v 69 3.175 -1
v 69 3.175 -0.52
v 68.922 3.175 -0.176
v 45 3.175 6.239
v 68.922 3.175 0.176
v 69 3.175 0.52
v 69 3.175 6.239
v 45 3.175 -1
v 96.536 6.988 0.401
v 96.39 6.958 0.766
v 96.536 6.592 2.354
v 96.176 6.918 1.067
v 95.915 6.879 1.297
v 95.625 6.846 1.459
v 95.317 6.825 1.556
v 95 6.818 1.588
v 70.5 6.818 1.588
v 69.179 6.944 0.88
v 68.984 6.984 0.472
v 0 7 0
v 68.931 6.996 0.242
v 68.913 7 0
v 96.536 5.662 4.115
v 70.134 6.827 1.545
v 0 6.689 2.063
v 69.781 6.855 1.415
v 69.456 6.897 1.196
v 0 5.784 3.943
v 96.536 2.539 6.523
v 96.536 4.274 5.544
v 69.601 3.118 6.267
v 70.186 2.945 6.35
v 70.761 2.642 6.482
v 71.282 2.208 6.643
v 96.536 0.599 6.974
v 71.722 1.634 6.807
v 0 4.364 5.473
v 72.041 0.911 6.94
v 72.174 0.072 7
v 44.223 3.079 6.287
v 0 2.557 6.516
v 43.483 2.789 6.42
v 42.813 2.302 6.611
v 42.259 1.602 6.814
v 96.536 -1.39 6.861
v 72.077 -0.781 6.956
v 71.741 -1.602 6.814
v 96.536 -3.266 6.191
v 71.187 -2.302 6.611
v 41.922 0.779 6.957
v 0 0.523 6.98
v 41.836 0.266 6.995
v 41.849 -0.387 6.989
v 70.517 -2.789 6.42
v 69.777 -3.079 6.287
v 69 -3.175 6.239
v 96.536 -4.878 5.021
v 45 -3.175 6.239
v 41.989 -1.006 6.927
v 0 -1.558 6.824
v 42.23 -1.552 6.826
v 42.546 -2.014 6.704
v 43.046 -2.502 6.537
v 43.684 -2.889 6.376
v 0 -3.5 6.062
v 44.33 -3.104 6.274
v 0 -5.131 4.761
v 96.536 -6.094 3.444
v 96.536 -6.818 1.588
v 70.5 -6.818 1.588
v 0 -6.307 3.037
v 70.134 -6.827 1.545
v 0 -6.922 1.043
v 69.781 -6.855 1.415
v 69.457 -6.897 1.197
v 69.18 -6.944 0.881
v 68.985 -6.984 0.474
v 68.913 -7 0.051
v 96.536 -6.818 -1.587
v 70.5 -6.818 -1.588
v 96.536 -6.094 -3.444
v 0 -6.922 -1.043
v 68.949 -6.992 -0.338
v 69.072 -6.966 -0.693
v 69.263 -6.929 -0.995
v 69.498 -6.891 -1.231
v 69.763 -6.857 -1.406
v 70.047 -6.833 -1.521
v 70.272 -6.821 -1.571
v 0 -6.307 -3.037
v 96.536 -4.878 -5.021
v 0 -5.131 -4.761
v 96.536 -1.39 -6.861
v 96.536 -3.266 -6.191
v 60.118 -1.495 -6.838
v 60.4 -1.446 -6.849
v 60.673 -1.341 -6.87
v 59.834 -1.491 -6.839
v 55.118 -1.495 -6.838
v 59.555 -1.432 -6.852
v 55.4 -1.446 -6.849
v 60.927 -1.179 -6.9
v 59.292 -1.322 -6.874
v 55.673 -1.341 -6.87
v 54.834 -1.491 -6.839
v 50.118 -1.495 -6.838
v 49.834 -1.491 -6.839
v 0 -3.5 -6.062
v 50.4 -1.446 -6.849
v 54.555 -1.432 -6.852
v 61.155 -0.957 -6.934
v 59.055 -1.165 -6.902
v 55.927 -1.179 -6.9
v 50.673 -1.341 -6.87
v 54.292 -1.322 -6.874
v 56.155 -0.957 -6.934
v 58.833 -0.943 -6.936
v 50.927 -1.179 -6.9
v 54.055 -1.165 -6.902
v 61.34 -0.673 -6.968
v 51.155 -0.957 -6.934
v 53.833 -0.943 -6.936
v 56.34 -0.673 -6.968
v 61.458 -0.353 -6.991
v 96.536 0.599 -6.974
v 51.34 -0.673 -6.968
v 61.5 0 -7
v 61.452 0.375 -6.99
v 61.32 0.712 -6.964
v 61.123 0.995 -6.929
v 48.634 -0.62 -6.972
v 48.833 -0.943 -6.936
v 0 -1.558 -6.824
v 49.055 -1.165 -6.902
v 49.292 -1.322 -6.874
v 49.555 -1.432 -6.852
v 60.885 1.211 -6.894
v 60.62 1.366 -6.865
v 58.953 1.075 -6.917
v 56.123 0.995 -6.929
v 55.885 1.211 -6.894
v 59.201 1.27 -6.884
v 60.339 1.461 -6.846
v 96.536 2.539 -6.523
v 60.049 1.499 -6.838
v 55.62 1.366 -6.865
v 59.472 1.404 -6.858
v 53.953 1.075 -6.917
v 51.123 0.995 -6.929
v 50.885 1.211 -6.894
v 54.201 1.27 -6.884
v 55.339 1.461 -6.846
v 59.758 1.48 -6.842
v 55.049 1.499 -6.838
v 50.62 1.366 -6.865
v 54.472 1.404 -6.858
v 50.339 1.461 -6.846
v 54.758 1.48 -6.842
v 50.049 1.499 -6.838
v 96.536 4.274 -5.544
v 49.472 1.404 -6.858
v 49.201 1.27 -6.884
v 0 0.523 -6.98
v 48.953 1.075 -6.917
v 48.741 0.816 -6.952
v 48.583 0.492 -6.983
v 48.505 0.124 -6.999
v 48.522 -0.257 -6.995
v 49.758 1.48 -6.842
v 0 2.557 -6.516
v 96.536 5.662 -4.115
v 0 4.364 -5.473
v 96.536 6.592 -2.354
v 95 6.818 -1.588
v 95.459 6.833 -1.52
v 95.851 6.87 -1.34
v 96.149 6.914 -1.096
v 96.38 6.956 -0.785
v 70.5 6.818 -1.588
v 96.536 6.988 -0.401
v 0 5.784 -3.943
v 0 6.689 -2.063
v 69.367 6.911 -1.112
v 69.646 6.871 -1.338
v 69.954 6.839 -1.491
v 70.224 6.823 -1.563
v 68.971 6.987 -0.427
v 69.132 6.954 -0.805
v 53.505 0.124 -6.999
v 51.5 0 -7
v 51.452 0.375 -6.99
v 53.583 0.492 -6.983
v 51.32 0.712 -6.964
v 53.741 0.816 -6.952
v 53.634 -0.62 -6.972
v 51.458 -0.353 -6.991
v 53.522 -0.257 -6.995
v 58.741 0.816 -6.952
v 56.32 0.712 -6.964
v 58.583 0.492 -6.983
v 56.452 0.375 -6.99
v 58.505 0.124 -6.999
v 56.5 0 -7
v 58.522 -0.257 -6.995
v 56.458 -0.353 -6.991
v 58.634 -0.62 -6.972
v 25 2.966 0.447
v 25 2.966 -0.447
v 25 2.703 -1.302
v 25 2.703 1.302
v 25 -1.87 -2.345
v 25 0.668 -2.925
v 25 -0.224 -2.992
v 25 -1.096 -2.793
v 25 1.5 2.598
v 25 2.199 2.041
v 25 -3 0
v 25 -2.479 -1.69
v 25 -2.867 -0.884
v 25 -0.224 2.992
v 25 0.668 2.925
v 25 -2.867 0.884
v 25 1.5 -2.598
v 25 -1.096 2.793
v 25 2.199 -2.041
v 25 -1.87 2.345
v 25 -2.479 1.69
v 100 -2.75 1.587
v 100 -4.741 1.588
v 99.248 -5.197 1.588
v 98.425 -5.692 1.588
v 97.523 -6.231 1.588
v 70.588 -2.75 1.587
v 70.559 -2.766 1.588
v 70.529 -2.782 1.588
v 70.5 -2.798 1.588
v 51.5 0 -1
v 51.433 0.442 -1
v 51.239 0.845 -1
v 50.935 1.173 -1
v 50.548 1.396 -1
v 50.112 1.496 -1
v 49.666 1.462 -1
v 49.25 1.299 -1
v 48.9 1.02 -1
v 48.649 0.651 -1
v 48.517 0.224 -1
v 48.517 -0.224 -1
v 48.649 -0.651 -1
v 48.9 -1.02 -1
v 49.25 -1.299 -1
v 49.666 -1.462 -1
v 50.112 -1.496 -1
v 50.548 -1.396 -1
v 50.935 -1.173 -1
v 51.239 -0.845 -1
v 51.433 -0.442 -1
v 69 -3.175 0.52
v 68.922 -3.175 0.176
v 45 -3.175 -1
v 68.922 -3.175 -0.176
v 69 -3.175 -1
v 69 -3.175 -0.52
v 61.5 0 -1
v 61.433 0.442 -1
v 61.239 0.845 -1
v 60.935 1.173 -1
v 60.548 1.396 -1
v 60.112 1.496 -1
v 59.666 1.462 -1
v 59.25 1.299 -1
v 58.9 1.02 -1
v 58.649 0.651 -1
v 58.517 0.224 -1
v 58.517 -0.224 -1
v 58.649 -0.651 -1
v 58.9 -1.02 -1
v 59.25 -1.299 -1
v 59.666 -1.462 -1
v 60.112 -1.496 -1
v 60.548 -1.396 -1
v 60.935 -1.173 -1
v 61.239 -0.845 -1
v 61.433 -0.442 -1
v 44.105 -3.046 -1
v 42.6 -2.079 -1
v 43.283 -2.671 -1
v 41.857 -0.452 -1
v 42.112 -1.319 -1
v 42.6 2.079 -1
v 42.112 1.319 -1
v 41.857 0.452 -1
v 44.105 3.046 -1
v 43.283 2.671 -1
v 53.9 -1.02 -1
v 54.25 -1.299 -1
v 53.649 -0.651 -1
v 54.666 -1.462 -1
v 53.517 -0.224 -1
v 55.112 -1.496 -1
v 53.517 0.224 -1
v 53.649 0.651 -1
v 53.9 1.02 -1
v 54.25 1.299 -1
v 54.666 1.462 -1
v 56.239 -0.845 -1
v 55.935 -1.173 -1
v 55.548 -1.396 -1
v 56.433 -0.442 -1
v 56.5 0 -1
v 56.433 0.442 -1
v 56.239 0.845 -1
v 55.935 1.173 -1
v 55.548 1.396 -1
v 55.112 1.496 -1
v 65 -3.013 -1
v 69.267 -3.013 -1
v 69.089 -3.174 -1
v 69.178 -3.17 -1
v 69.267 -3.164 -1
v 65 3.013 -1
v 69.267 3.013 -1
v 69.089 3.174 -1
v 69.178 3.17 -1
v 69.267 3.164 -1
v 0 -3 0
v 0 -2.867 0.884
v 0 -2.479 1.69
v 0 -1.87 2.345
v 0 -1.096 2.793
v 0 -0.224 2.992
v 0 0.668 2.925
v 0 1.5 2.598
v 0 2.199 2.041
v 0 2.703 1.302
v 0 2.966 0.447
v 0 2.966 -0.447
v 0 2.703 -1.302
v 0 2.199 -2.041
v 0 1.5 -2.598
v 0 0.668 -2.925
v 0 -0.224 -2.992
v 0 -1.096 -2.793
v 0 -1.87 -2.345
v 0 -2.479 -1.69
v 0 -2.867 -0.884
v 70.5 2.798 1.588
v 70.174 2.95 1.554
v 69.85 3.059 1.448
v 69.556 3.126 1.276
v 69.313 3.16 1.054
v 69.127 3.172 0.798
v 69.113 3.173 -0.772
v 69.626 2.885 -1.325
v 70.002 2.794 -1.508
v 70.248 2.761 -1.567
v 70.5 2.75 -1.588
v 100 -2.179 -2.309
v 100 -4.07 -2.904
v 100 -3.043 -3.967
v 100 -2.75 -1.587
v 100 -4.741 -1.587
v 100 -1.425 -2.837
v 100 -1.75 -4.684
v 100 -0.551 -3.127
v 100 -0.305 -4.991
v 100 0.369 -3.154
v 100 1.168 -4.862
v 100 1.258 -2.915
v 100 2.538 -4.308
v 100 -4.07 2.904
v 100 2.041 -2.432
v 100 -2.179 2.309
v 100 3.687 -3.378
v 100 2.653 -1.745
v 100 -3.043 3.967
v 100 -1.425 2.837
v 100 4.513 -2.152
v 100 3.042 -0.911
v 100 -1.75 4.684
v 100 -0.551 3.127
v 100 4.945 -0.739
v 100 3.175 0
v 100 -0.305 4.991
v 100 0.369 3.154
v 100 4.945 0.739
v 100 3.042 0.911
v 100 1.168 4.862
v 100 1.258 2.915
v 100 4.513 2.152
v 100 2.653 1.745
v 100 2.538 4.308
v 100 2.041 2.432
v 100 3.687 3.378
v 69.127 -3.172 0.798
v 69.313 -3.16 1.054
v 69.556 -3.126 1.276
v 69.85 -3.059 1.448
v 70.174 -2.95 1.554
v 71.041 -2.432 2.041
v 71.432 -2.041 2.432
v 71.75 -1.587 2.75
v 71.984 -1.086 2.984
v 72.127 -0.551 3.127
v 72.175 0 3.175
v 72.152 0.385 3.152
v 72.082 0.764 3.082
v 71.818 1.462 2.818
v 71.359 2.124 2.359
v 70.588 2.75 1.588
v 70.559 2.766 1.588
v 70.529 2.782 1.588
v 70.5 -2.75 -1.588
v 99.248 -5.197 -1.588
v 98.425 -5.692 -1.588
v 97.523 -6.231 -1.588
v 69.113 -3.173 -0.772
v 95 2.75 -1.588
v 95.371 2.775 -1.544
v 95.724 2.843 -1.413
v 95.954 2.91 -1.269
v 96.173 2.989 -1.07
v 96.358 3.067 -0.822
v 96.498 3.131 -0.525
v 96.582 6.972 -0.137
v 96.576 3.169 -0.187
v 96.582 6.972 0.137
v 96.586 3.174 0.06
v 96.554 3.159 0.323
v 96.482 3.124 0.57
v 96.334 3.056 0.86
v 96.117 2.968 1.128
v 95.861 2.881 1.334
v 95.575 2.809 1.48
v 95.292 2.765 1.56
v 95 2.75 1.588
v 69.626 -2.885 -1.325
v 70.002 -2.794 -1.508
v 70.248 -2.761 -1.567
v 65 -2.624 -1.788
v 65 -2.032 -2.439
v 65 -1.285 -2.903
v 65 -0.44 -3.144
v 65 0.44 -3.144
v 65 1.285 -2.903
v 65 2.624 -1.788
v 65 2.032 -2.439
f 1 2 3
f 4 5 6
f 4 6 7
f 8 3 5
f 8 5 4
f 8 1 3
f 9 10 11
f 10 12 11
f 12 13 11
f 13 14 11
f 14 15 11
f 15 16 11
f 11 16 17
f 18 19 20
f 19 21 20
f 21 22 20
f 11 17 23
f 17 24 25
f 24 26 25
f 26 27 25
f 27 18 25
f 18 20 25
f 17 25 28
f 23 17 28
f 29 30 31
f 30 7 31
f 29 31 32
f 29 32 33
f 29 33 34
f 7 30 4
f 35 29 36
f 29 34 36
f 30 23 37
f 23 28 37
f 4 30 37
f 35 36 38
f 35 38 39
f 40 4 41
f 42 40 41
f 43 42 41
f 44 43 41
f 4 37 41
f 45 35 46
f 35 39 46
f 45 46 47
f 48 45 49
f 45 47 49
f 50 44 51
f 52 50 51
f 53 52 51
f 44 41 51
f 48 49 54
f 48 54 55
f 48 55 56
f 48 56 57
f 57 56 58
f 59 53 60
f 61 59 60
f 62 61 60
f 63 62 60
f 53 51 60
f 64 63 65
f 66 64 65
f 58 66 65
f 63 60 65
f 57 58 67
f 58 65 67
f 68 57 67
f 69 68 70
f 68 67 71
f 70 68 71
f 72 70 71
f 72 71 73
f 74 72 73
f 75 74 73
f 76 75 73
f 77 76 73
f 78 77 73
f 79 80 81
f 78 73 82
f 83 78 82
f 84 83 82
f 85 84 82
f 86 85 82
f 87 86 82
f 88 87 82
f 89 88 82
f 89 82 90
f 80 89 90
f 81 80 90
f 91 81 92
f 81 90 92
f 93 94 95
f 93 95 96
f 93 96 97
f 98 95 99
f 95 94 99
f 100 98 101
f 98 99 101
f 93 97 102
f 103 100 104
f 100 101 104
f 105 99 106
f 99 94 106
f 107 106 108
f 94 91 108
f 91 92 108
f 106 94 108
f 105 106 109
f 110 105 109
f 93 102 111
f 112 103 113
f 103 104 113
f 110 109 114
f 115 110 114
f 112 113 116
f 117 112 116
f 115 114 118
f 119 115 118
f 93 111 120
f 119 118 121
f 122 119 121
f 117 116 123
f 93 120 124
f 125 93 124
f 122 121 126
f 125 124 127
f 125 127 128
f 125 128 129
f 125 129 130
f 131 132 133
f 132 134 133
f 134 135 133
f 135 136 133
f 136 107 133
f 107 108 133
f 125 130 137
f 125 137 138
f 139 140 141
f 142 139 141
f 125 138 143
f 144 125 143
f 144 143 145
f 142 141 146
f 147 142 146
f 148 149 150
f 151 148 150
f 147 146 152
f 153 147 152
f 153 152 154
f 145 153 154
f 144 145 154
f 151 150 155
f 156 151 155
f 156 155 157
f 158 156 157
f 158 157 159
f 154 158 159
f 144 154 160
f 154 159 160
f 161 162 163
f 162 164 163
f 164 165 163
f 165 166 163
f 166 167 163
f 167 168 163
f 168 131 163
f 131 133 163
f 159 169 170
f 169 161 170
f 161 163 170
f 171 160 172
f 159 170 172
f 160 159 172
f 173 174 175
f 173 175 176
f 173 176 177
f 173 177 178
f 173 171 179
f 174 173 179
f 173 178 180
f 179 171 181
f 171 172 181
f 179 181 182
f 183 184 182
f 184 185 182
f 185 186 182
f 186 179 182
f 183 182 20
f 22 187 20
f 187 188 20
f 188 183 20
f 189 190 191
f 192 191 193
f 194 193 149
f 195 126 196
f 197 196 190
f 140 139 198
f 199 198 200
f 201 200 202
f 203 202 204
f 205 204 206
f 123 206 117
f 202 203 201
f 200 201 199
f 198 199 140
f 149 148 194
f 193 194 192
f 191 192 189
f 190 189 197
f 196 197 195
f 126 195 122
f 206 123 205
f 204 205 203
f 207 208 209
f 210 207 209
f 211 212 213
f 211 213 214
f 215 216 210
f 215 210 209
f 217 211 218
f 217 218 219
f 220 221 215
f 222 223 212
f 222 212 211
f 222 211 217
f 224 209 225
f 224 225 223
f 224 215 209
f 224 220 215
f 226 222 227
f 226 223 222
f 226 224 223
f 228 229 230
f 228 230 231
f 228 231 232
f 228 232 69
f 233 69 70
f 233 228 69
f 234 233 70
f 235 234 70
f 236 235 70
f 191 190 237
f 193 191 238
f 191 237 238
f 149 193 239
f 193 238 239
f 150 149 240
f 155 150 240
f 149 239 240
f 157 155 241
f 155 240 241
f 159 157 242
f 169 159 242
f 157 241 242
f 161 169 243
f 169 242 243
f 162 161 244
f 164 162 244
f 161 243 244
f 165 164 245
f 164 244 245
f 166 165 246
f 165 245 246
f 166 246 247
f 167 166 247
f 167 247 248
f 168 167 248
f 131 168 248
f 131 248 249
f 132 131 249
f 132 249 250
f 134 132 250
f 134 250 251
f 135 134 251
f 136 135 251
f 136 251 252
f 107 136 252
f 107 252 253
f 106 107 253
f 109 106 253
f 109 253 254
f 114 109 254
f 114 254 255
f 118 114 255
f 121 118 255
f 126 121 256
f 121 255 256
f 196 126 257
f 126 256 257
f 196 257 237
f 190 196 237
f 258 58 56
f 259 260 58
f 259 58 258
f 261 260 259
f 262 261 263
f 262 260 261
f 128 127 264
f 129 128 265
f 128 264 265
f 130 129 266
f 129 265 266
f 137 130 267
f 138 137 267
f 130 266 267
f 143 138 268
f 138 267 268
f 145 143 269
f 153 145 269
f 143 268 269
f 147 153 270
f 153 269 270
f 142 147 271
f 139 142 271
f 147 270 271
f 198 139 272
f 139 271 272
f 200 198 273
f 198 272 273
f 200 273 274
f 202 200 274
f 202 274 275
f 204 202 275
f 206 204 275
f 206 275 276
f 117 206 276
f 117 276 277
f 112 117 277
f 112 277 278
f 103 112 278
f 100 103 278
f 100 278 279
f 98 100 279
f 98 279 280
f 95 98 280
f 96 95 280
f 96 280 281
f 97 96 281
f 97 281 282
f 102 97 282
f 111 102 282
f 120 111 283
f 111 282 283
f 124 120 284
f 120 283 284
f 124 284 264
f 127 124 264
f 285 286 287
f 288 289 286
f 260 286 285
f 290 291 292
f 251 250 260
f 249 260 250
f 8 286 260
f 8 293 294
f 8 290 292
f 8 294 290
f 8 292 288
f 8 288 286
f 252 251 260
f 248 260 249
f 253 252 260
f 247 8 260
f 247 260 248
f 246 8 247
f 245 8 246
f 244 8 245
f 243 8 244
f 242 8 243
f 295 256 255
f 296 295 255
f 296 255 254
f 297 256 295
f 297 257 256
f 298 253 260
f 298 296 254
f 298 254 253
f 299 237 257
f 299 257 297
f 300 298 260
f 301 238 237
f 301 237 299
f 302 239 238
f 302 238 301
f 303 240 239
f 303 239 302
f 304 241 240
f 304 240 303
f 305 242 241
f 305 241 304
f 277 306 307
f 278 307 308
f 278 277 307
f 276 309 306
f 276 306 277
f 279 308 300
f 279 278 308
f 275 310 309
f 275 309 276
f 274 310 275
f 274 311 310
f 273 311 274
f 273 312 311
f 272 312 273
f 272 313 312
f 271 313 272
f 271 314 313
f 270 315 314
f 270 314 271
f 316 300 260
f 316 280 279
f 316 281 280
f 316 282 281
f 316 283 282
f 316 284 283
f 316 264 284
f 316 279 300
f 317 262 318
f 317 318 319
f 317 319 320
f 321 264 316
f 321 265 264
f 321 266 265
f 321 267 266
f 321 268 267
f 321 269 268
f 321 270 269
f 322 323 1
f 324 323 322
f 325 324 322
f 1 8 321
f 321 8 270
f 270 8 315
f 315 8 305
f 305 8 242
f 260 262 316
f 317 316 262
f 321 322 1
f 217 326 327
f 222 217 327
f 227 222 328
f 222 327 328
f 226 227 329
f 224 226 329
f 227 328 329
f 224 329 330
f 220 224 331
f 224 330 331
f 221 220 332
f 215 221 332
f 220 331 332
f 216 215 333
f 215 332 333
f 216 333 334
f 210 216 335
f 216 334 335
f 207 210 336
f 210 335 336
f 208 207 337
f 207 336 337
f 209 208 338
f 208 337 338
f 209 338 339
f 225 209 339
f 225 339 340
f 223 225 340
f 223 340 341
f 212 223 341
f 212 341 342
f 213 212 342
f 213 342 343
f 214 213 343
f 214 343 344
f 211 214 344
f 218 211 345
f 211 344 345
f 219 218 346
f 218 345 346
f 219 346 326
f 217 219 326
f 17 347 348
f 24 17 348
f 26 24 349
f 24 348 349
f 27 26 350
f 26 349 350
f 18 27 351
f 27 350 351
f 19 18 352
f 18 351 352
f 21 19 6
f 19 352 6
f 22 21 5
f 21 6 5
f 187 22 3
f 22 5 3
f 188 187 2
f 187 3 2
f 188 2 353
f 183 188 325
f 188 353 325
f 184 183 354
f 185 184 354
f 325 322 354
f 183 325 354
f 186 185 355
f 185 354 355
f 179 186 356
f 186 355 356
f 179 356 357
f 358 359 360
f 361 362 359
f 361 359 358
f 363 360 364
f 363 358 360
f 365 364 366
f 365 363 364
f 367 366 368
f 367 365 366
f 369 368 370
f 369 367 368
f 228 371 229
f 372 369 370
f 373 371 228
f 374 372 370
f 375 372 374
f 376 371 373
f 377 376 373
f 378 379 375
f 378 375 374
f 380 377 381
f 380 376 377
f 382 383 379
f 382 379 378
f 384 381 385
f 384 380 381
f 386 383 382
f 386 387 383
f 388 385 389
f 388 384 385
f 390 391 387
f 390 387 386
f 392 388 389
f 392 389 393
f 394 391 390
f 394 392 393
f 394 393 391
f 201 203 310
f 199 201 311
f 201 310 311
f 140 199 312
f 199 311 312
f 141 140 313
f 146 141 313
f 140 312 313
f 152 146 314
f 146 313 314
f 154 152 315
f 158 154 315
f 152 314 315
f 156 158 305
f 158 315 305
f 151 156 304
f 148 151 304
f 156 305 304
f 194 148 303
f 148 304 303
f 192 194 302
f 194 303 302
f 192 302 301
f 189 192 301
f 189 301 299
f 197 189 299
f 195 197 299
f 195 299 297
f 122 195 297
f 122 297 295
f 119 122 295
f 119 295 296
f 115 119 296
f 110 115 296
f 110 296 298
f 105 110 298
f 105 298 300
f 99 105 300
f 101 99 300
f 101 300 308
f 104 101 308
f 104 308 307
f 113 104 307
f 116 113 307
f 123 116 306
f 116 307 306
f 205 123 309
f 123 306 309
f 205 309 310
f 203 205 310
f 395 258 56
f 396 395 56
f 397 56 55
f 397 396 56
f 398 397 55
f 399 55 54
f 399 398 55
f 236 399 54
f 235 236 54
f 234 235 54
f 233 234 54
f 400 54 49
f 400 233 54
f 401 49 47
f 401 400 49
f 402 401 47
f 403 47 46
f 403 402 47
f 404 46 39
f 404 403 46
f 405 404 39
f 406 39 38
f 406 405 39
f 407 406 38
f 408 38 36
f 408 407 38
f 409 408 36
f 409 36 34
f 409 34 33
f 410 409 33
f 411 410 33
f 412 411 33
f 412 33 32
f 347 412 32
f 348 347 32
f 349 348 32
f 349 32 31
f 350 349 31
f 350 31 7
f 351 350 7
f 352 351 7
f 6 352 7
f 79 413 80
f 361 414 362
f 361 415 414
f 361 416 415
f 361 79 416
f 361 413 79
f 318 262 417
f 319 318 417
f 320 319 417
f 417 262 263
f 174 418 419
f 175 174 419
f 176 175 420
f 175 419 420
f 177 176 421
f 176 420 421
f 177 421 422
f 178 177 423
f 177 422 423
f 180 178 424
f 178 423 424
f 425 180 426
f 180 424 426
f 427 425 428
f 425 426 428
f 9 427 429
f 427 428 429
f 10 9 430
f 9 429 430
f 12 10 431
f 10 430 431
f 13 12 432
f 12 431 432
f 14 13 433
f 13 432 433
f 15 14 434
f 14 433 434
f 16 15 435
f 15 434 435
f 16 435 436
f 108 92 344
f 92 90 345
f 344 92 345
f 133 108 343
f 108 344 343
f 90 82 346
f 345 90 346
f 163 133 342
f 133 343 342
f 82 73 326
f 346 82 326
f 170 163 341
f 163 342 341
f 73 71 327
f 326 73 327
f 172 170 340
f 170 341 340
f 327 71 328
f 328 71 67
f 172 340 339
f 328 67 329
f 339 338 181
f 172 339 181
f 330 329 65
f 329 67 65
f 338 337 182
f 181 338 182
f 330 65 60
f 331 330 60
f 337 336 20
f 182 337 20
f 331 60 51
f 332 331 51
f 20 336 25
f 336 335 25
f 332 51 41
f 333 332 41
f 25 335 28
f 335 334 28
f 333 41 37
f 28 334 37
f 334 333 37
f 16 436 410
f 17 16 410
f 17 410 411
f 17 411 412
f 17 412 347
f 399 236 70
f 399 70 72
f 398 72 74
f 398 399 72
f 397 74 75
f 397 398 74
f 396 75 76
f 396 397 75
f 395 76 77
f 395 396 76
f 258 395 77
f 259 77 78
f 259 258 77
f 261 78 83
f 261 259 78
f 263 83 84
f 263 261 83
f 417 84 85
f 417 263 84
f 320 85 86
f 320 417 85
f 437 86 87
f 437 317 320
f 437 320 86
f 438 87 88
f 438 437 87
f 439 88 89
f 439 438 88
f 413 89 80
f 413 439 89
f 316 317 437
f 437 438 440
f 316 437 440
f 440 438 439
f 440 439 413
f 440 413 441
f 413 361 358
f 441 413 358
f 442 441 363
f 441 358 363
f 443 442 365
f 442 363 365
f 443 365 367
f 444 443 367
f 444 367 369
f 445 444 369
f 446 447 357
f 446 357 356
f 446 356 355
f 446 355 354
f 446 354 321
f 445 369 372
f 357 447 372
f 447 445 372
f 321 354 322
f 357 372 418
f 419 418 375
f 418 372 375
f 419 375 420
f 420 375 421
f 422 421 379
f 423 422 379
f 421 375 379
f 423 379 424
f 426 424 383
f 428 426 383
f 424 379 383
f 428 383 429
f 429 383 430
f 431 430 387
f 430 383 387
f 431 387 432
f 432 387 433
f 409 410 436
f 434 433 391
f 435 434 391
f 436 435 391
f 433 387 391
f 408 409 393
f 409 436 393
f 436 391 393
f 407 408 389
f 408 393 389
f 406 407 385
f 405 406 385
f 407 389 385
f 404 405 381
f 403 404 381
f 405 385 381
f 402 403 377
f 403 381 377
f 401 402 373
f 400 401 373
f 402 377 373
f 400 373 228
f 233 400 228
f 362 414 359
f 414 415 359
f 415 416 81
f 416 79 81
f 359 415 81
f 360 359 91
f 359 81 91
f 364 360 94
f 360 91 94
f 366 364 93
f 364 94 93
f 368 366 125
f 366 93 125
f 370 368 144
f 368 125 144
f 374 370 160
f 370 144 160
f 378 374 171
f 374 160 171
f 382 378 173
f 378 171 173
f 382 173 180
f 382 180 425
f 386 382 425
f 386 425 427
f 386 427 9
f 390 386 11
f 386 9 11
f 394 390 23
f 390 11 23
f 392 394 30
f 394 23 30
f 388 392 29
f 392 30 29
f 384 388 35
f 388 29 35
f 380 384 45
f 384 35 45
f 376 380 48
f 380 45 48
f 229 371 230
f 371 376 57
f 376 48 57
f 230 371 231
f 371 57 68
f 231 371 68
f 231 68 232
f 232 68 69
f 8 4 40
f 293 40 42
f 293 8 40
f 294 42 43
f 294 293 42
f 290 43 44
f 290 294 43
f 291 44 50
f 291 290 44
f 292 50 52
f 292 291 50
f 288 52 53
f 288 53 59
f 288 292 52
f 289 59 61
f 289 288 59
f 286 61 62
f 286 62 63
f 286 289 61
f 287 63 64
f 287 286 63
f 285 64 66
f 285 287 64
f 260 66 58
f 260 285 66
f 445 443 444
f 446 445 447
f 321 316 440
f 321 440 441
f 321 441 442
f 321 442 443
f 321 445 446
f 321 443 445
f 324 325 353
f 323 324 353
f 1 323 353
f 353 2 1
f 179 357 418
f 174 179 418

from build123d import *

# Parameters (mm, degrees)
F0_R           = 7
F1_DEPTH       = 100
F2_R           = 3.175
F3_DEPTH       = 35
F4_R           = 3
F5_DEPTH       = 25
F6_SIZE2       = 3.4641016151
F6_SIZE        = 2
F8_DEPTH       = 7.001
F8_DEPTH_BACK  = 1
F10_DEPTH      = 7.0010001
F10_DEPTH_BACK = 7.0010001
F11_W          = 15
F11_H          = 3.175
F12_DEPTH      = 25.0000003725
F13_R          = 1.5
F14_DEPTH      = 6.0010001


with BuildPart() as f1:
    # F0 (on Right) → F1 (new body)
    with BuildSketch(Plane.YZ):
        Circle(F0_R)
    extrude(amount=F1_DEPTH)

    # F2 (on face) → F3 (cut)
    with BuildSketch(Plane.YZ.offset(100)):
        Circle(F2_R)
    extrude(amount=-F3_DEPTH, mode=Mode.SUBTRACT)

    # F4 (on face) → F5 (cut)
    with BuildSketch(Plane(origin=(0, 0, 0), x_dir=(0, -1, 0), z_dir=(-1, 0, 0))):
        Circle(F4_R)
    extrude(amount=-F5_DEPTH, mode=Mode.SUBTRACT)

    # F6
    f6_edges = [f1.edges().sort_by_distance(p)[0] for p in [
        (100, -7, 0),
    ]]
    f6_side = f1.faces().sort_by_distance((100, -6.80201, 0))[0]
    chamfer(f6_edges, length=F6_SIZE, length2=F6_SIZE2, reference=f6_side)

    # F7 (on Top) → F8 (cut, two sides)
    with BuildSketch(Plane.XY) as f8_sk:
        with BuildLine():
            Line((69, 3.175), (45, 3.175))
            ThreePointArc((45, 3.175), (41.825, 0), (45, -3.175))
            Line((45, -3.175), (69, -3.175))
            ThreePointArc((69, -3.175), (72.175, 0), (69, 3.175))
        make_face()
    extrude(amount=F8_DEPTH, mode=Mode.SUBTRACT)
    extrude(f8_sk.sketch, amount=-F8_DEPTH_BACK, mode=Mode.SUBTRACT)

    # F9 (on Front) → F10 (cut, two sides)
    with BuildSketch(Plane.XZ) as f10_sk:
        with BuildLine():
            Line((95, 1.5875), (70.5, 1.5875))
            ThreePointArc((70.5, 1.5875), (68.9125, 0), (70.5, -1.5875))
            Line((70.5, -1.5875), (95, -1.5875))
            ThreePointArc((95, -1.5875), (96.5875, 0), (95, 1.5875))
        make_face()
    extrude(amount=-F10_DEPTH, mode=Mode.SUBTRACT)
    extrude(f10_sk.sketch, amount=F10_DEPTH_BACK, mode=Mode.SUBTRACT)

    # F11 (on Front) → F12 (cut)
    with BuildSketch(Plane.XZ):
        with Locations((95.5, 0)):
            Rectangle(F11_W, F11_H)
    extrude(amount=F12_DEPTH, mode=Mode.SUBTRACT)

    # F13 (on face) → F14 (cut, through all)
    with BuildSketch(Plane.XY.offset(-1)):
        with Locations((50, 0)):
            Circle(F13_R)
        with Locations((55, 0)):
            Circle(F13_R)
        with Locations((60, 0)):
            Circle(F13_R)
    extrude(amount=-F14_DEPTH, mode=Mode.SUBTRACT)


solid = f1.part
